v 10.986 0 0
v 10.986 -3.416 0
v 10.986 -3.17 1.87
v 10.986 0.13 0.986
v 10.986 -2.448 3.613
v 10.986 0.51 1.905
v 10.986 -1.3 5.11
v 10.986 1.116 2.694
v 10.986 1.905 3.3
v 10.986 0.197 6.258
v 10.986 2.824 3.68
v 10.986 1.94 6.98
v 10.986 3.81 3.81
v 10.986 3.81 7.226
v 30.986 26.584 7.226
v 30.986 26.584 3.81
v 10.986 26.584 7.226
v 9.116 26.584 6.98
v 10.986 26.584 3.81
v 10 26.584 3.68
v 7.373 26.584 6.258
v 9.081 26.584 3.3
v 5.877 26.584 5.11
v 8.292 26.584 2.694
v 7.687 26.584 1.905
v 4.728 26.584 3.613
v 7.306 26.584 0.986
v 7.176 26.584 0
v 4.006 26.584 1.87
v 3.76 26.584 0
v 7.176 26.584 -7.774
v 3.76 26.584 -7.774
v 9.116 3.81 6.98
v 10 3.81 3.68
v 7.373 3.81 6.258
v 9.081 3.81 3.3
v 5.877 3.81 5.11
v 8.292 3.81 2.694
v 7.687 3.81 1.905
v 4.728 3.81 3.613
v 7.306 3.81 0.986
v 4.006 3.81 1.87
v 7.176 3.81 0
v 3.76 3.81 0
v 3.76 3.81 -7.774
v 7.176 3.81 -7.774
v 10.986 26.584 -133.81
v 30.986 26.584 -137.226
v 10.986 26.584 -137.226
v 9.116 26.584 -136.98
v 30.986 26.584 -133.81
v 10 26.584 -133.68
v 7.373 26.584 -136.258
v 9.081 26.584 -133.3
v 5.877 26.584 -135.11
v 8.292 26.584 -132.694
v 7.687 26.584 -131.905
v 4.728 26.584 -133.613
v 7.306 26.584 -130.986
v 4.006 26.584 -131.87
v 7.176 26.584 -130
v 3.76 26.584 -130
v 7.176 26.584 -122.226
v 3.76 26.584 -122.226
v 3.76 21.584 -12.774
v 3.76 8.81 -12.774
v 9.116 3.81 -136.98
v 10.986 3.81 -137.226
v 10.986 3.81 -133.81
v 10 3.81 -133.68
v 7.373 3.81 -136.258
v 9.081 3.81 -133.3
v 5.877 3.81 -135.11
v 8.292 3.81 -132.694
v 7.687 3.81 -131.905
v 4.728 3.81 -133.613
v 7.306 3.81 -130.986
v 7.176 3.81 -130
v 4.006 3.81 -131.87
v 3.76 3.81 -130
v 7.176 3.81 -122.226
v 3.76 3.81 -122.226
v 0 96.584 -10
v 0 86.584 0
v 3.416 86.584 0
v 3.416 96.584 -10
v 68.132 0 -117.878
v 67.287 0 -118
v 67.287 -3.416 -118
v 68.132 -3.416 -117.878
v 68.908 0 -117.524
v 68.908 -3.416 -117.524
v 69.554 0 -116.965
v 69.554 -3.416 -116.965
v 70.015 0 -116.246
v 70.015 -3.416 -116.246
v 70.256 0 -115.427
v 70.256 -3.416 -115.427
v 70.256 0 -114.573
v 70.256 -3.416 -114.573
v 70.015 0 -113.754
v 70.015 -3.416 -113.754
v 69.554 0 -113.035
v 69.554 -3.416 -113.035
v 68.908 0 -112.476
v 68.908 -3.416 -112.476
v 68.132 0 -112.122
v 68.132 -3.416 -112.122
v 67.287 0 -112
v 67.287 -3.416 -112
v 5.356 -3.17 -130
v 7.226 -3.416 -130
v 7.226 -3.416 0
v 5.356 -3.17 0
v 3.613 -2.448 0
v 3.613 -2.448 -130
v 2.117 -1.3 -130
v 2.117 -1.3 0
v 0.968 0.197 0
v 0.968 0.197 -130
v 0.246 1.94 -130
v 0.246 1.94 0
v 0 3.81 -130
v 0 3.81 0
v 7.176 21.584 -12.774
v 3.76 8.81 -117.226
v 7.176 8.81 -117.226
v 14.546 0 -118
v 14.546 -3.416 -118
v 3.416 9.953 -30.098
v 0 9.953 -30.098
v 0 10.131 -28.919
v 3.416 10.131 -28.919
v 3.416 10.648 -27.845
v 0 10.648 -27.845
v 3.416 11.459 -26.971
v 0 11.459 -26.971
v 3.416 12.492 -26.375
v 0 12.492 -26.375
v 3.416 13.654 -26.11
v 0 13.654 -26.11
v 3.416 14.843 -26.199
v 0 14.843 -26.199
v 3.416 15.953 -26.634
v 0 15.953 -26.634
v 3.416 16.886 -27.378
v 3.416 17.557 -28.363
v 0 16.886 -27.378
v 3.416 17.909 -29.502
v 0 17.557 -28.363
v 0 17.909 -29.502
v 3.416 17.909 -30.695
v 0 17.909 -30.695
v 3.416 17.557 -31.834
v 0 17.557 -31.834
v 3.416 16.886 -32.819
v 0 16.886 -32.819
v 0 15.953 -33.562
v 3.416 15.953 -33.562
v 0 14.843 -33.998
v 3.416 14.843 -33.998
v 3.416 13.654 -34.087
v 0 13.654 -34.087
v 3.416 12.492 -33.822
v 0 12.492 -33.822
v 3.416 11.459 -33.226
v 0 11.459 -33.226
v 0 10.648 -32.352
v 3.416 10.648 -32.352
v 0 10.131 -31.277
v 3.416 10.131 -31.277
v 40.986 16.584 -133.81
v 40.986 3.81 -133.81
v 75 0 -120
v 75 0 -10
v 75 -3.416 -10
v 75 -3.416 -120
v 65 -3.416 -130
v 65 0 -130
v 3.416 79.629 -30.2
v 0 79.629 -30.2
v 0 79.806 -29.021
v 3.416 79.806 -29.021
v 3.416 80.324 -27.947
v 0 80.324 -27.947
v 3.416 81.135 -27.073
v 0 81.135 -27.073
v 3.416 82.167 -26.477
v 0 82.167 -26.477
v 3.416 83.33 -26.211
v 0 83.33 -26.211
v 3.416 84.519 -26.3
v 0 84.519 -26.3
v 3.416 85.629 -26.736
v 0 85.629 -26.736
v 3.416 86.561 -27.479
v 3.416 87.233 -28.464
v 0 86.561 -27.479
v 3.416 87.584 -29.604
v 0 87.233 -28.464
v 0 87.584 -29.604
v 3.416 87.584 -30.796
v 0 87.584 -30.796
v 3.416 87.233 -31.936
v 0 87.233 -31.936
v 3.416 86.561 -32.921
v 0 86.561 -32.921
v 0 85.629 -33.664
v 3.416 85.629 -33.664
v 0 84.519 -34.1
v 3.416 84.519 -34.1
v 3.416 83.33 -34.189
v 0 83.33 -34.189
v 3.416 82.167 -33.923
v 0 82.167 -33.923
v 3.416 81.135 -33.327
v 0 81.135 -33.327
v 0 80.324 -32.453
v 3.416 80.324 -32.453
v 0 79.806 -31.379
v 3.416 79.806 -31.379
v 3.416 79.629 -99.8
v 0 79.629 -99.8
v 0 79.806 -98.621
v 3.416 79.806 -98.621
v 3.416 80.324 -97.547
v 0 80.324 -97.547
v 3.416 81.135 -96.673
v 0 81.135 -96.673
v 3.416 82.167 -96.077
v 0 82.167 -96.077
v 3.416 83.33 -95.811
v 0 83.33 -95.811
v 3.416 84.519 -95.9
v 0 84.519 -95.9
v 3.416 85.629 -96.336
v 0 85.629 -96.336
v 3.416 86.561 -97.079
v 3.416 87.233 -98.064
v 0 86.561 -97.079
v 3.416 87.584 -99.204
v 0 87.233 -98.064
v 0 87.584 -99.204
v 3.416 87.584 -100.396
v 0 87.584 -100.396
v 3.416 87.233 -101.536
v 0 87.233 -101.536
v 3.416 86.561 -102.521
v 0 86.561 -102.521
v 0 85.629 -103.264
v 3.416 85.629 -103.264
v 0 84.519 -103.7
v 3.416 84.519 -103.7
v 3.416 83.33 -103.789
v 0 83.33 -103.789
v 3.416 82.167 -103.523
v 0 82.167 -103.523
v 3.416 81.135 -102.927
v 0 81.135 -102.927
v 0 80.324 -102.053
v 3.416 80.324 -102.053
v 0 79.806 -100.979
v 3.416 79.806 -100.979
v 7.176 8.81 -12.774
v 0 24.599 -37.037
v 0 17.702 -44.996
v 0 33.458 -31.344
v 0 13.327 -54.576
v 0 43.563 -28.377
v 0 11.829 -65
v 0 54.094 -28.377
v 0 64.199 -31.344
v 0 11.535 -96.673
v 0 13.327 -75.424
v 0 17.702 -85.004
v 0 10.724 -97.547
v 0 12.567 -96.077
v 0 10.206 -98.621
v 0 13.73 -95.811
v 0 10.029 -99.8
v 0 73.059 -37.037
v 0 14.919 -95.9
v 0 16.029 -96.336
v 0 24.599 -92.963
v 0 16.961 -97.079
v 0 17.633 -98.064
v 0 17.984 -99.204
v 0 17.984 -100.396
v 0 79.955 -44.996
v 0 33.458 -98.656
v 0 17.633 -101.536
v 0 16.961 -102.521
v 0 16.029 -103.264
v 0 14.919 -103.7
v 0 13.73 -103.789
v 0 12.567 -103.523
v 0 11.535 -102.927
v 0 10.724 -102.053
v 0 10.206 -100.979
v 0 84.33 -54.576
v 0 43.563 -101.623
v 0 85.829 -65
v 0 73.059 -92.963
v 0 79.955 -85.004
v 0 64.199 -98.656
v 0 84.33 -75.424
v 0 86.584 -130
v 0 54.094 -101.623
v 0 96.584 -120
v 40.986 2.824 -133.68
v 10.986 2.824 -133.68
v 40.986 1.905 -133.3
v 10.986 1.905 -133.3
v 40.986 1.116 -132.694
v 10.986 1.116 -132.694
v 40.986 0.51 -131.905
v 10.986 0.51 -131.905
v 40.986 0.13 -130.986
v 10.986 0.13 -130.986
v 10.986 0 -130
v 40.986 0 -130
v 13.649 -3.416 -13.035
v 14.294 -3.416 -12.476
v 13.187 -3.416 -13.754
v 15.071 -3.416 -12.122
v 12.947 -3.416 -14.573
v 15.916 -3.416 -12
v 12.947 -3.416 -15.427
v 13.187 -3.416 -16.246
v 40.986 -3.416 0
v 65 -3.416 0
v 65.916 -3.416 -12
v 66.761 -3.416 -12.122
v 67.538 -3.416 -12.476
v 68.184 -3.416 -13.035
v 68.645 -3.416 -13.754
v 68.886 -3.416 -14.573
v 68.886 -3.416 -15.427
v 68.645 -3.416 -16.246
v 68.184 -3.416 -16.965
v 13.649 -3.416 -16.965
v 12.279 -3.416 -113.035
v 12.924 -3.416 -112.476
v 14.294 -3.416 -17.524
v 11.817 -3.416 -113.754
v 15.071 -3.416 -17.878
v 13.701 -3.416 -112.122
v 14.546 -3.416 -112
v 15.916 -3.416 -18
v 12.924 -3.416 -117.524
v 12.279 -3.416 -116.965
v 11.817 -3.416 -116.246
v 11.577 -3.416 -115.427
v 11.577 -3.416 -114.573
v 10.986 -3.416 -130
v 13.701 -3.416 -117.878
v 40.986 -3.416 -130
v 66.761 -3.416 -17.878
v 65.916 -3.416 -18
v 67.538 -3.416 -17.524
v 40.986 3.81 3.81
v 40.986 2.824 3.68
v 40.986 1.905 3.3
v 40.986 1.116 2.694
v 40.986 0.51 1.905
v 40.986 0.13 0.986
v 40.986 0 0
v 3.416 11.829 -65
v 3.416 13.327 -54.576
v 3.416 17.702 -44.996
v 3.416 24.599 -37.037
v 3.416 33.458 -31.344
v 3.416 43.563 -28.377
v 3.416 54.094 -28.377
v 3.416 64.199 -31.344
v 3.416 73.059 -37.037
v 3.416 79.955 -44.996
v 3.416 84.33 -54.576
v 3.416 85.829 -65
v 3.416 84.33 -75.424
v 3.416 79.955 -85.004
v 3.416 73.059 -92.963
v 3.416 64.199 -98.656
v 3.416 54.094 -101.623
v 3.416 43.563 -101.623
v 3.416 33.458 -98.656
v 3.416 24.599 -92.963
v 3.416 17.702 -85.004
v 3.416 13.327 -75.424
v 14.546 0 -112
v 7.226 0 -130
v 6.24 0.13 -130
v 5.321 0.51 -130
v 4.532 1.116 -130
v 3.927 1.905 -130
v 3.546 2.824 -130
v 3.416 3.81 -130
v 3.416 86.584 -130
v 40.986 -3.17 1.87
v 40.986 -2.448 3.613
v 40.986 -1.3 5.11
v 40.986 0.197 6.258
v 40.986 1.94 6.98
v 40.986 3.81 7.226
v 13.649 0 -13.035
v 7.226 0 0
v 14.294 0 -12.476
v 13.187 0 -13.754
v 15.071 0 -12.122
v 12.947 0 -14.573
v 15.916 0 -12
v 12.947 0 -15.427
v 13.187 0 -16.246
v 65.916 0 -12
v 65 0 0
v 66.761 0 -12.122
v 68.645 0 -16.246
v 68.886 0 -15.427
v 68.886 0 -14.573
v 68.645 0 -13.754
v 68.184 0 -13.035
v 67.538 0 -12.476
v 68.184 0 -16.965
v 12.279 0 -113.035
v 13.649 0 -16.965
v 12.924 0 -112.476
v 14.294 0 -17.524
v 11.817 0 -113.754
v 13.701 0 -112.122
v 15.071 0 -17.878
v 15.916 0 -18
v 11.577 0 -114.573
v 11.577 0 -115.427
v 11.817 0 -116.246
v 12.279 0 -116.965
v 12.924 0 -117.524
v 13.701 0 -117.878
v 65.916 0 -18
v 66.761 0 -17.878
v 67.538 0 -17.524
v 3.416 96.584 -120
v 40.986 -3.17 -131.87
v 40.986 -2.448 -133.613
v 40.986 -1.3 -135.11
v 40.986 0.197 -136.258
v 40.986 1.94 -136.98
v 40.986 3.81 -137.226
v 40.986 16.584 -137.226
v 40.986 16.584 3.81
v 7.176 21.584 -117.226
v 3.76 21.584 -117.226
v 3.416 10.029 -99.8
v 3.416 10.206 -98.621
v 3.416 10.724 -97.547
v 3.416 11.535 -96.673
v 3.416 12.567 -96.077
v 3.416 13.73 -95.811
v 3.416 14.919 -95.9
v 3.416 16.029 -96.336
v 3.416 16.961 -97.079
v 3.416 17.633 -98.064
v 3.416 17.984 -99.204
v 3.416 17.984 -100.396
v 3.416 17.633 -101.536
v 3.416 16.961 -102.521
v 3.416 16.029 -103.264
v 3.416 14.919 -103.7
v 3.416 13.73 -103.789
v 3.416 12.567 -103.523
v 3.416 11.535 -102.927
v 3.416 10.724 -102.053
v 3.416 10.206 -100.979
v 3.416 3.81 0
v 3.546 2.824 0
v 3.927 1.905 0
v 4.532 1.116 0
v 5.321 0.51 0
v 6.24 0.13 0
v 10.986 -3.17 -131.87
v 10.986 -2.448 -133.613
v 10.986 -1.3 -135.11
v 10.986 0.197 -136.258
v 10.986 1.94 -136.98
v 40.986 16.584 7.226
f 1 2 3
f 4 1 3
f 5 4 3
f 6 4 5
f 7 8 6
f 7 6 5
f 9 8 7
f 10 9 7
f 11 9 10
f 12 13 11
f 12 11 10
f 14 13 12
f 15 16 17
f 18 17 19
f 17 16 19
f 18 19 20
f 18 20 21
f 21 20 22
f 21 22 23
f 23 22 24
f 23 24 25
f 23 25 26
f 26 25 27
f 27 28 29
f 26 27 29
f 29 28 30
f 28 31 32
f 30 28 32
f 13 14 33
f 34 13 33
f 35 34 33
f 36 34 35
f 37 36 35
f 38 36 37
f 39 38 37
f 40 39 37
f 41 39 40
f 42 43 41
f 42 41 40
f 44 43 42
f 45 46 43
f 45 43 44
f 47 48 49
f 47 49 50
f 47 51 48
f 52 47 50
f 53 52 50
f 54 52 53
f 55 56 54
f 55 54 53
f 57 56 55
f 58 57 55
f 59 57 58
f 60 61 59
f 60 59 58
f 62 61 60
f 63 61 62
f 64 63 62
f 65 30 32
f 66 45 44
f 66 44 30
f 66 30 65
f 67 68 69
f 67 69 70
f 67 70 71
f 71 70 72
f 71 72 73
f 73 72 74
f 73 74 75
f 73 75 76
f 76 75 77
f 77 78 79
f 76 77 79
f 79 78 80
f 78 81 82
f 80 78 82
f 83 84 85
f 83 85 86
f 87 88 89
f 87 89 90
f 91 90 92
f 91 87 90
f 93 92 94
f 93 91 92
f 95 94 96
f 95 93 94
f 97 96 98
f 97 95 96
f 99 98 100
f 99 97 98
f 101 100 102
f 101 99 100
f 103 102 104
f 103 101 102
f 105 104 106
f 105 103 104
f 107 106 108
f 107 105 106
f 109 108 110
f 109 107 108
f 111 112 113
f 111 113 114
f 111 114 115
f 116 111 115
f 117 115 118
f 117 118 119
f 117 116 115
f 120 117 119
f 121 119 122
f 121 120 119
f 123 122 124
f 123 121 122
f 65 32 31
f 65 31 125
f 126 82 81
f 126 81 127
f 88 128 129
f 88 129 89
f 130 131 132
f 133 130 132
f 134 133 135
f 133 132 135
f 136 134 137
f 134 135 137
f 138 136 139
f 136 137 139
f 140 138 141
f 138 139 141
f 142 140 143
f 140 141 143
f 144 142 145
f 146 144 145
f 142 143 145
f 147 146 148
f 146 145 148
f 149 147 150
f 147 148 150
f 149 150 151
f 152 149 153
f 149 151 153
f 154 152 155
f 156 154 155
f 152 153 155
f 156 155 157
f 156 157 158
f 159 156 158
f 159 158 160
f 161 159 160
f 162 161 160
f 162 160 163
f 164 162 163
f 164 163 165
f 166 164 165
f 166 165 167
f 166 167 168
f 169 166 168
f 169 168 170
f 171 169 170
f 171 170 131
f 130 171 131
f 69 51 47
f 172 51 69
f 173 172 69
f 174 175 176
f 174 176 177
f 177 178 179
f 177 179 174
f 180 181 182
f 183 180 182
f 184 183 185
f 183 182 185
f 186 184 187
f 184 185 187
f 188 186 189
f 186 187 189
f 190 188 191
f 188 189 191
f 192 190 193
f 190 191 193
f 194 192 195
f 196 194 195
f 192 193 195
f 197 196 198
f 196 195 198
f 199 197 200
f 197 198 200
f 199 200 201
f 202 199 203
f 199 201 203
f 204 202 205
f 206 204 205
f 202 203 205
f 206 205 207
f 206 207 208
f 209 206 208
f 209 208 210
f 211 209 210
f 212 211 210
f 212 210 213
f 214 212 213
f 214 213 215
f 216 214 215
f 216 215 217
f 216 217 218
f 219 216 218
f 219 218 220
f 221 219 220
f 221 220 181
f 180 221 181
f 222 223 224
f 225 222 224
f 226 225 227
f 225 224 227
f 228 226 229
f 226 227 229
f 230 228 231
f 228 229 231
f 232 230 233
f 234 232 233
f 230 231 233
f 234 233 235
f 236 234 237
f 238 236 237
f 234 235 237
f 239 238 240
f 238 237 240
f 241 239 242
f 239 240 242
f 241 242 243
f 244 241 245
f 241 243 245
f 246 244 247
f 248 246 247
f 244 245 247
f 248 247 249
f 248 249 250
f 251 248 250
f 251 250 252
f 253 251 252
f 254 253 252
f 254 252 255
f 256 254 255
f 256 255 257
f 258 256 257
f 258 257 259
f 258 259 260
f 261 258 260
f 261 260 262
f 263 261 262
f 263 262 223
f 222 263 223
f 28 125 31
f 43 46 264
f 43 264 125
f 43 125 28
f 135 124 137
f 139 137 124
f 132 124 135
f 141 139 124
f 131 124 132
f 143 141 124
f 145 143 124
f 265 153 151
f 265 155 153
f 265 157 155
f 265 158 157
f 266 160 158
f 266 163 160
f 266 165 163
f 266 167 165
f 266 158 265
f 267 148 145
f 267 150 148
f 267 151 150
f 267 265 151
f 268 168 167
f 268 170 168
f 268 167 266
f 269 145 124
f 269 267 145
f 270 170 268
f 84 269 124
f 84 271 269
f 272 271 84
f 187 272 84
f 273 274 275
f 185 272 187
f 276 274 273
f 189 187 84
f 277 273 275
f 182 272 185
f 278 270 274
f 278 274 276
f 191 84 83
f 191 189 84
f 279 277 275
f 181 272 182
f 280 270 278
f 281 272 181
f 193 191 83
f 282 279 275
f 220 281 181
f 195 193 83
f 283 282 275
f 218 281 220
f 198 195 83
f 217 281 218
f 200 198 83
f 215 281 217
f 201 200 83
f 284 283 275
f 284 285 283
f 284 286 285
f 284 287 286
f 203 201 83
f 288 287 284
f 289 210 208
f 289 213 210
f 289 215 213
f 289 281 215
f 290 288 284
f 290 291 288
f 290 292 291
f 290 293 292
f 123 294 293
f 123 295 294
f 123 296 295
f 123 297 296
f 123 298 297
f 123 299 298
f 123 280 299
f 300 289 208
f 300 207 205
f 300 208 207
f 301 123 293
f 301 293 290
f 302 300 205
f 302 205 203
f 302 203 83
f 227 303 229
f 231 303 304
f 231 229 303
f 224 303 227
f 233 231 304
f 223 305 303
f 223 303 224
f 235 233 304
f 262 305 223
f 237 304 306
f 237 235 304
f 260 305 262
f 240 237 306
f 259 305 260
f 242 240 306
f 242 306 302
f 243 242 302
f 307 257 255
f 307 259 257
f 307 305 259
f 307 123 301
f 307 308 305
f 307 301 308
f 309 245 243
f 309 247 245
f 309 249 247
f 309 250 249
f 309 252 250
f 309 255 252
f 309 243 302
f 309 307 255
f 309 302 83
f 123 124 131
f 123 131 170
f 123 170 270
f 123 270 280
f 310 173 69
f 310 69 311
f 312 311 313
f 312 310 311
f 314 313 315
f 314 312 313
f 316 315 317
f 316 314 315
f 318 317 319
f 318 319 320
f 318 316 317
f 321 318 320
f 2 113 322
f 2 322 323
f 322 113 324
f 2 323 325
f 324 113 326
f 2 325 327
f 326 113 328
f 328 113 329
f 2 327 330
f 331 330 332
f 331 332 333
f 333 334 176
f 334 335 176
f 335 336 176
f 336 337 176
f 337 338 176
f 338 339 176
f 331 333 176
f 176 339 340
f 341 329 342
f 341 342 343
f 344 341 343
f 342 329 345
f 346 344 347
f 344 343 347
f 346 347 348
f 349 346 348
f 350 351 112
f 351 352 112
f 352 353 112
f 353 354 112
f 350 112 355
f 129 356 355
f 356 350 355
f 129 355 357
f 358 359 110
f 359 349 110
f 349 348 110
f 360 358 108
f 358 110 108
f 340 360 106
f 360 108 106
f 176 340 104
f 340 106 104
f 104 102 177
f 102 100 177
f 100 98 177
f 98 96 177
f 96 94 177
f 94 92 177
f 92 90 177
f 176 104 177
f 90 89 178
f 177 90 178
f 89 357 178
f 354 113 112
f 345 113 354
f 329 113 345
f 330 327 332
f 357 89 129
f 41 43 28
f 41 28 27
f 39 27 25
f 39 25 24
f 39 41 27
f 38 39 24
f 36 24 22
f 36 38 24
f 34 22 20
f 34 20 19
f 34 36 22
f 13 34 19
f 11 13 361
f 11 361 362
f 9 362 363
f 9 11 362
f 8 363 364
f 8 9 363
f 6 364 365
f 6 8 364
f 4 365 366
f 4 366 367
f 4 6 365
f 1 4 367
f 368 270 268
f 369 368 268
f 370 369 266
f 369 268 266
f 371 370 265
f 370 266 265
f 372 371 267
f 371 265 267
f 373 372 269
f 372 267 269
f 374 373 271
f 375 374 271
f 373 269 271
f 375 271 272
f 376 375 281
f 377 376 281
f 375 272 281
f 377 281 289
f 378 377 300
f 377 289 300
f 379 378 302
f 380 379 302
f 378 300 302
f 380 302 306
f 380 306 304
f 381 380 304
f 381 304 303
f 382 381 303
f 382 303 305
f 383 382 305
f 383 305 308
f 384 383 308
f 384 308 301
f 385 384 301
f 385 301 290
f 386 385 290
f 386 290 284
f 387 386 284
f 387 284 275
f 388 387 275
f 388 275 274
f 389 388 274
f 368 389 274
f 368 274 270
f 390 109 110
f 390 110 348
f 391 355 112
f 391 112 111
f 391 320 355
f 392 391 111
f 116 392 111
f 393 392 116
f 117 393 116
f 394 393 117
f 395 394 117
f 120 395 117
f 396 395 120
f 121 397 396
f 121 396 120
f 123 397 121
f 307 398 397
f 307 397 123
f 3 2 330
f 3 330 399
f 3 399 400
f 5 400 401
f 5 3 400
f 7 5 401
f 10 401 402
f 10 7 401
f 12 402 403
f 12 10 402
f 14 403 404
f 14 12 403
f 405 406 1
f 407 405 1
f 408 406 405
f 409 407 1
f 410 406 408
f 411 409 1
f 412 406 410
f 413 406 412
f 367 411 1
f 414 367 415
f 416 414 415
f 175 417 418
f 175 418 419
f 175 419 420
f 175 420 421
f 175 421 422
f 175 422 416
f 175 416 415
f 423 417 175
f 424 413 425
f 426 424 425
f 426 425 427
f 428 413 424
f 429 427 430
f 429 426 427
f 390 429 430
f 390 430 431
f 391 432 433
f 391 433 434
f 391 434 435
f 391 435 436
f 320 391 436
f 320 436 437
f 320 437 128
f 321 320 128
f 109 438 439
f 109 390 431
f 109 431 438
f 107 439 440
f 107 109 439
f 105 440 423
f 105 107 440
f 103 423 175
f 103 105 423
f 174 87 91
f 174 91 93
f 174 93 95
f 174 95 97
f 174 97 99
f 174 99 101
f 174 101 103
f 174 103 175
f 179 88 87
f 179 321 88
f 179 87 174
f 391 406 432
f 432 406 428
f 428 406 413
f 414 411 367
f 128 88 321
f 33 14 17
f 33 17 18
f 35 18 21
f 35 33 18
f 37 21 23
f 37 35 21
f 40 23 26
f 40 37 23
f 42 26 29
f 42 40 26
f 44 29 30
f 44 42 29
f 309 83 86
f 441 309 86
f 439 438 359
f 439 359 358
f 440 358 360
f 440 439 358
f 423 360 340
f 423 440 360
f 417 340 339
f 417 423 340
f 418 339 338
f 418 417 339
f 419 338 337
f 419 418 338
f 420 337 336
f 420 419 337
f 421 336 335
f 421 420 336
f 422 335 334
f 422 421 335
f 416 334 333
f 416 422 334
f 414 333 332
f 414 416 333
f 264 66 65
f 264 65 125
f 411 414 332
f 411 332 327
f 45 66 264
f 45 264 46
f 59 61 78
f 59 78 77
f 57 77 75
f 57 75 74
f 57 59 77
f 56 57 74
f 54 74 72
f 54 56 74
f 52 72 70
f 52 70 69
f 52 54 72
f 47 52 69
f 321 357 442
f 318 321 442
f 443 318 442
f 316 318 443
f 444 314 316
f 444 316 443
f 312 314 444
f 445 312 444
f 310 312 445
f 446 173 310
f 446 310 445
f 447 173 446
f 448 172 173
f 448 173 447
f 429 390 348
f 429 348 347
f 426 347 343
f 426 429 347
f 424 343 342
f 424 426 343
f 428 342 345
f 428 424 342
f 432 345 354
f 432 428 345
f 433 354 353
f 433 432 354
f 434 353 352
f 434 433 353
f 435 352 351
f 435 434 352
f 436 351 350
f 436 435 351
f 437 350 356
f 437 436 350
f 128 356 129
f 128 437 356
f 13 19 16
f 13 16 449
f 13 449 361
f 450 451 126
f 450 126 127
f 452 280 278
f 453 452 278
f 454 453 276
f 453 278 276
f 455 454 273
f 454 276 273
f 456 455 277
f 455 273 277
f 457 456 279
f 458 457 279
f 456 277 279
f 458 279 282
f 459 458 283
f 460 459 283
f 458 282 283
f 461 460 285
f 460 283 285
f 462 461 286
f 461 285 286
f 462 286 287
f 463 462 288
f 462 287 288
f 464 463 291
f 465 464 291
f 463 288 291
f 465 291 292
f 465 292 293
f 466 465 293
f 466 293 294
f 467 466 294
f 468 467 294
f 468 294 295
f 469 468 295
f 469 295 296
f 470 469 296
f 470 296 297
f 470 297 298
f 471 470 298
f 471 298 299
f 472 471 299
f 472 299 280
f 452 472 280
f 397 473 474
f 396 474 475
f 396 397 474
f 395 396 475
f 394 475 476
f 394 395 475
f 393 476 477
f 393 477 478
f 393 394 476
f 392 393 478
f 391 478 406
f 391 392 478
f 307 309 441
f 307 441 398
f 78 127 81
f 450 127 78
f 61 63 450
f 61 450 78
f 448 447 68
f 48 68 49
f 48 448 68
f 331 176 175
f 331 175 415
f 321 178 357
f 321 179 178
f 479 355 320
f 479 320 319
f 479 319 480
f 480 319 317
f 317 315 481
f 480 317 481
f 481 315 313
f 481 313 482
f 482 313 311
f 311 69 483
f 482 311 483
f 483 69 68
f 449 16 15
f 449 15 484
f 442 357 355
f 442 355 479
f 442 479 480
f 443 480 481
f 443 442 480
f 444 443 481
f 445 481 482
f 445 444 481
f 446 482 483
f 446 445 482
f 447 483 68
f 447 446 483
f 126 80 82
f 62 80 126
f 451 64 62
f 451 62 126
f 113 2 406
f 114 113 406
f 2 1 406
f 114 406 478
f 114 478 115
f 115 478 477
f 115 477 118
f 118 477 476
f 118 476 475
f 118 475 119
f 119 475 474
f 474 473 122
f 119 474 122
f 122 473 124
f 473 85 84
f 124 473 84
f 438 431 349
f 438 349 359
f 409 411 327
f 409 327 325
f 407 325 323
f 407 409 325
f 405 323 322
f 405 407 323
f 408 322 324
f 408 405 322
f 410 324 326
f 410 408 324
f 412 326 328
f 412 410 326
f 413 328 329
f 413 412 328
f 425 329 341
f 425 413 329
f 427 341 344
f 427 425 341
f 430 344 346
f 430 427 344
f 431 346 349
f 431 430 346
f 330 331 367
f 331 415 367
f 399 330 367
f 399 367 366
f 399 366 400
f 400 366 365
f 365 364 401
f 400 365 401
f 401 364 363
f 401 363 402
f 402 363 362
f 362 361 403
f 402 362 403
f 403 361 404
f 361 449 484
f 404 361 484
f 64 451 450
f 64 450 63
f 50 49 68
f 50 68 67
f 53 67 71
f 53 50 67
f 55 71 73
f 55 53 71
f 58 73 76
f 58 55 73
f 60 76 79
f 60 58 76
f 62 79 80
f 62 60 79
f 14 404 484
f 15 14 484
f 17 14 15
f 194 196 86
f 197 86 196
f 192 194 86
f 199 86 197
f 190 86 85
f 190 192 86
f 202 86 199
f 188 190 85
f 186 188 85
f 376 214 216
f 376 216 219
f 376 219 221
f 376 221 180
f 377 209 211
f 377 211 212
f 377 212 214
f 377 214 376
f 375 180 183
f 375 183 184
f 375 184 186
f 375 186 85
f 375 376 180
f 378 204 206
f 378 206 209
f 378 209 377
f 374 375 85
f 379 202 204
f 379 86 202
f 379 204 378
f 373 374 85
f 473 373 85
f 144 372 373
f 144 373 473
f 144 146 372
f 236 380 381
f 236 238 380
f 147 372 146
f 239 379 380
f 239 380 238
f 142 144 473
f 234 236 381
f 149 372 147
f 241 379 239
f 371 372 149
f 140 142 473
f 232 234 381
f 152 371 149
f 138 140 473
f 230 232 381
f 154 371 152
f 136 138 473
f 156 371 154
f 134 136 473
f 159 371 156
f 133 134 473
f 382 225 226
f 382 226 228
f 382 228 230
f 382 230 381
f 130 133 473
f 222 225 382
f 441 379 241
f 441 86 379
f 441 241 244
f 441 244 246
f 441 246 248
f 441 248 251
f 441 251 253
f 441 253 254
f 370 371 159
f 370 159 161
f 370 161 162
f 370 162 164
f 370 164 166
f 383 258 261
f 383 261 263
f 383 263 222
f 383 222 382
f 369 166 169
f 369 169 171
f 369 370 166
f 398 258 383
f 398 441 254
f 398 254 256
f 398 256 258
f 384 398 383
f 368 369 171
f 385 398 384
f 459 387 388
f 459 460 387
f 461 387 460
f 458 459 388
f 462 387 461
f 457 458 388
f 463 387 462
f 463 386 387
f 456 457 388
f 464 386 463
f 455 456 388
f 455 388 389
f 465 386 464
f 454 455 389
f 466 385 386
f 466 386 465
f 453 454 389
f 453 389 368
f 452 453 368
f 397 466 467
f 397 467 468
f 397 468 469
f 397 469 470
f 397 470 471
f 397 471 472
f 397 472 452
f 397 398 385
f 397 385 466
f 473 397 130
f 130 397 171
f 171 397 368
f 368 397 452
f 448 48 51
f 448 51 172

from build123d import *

# Parameters (mm, degrees)
SKETCH1_W                    = 75
SKETCH1_H                    = 130
BASE_FLANGE1_DEPTH           = 3.4163
EDGE_FLANGE1_STRIP_W         = 21.2852
EDGE_FLANGE1_STRIP_H         = 3.4163
EDGE_FLANGE1_STRIP_CUT_DEPTH = 130
EDGE_FLANGE1_DEPTH           = 130
SKETCH18_R                   = 37
SKETCH18_R_2                 = 4
CUT_EXTRUDE1_DEPTH           = 10
BREAK_CORNER1_DEPTH          = 3.4163
BREAK_CORNER2_START          = -3.4163
BREAK_CORNER2_DEPTH          = 3.4163
CUT_EXTRUDE2_DEPTH           = 10
EDGE_FLANGE2_DEPTH           = 30
EDGE_FLANGE3_DEPTH           = 22.7737
EDGE_FLANGE4_DEPTH           = 30
EDGE_FLANGE5_DEPTH           = 22.7737
BREAK_CORNER3_START          = 40.708137393
BREAK_CORNER3_OUTLINE_W      = 17
BREAK_CORNER3_OUTLINE_H      = 3.4163
BREAK_CORNER3_DEPTH          = 7.071067812
BREAK_CORNER4_START          = 3.76
BREAK_CORNER4_DEPTH          = 3.4163


# Read off the part's stored shape, not the designer's step: Break-Corner1, Break-Corner2, Break-Corner3, Break-Corner4
# Sheet-metal steps are written as plain solids
with BuildPart() as part:
    # Sketch1 → Base-Flange1 (new body)
    with BuildSketch(Plane(origin=(0, 0, 0), x_dir=(1, 0, 0), z_dir=(0, 1, 0))):
        with Locations((37.5, 65)):
            Rectangle(SKETCH1_W, SKETCH1_H)
    extrude(amount=-BASE_FLANGE1_DEPTH)

    # Edge-Flange1 strip (across the edge) → Edge-Flange1 strip cut (cut)
    with BuildSketch(Plane.XY.offset(-130)):
        with Locations((-3.4163, -1.70815)):
            Rectangle(EDGE_FLANGE1_STRIP_W, EDGE_FLANGE1_STRIP_H)
    extrude(amount=EDGE_FLANGE1_STRIP_CUT_DEPTH, mode=Mode.SUBTRACT)

    # Edge-Flange1 section (across the edge) → Edge-Flange1 (add)
    with BuildSketch(Plane.XY.offset(-130)):
        with BuildLine():
            Line((0, 3.81), (0, 96.5837))
            Line((0, 96.5837), (3.4163, 96.5837))
            Line((3.4163, 96.5837), (3.4163, 3.81))
            ThreePointArc((3.4163, 3.81), (4.532223164, 1.115923164), (7.2263, 0))
            Line((7.2263, 0), (7.2263, -3.4163))
            ThreePointArc((7.2263, -3.4163), (2.116534267, -1.299765733), (0, 3.81))
        make_face()
    extrude(amount=EDGE_FLANGE1_DEPTH)

    # Sketch18 → Cut-Extrude1 (cut)
    with BuildSketch(Plane.ZY):
        with Locations(Location((-65, 48.8287, 0), (0, 0, 270))):
            Circle(SKETCH18_R)
        with Locations(Location((-99.8, 83.6287, 0), (0, 0, 270))):
            Circle(SKETCH18_R_2)
        with Locations(Location((-30.2, 83.6287, 0), (0, 0, 270))):
            Circle(SKETCH18_R_2)
        with Locations(Location((-30.098341997, 13.953302375, 0), (0, 0, 270))):
            Circle(SKETCH18_R_2)
        with Locations(Location((-99.8, 14.0287, 0), (0, 0, 270))):
            Circle(SKETCH18_R_2)
    extrude(amount=-CUT_EXTRUDE1_DEPTH, mode=Mode.SUBTRACT)

    # Break-Corner1 outline → Break-Corner1 (cut)
    with BuildSketch(Plane.YZ):
        Polygon((96.5837, 0), (86.5837, 0), (96.5837, -10), align=None)
        Polygon((96.5837, -130), (96.5837, -120), (86.5837, -130), align=None)
    extrude(amount=BREAK_CORNER1_DEPTH, mode=Mode.SUBTRACT)

    # Break-Corner2 outline → Break-Corner2 (cut)
    with BuildSketch(Plane(origin=(0, 0, 0), x_dir=(1, 0, 0), z_dir=(0, 1, 0)).offset(BREAK_CORNER2_START)):
        Polygon((75, 0), (75, 10), (65, 0), align=None)
        Polygon((65, 130), (75, 120), (75, 130), align=None)
    extrude(amount=BREAK_CORNER2_DEPTH, mode=Mode.SUBTRACT)

    # Sketch19 → Cut-Extrude2 (cut)
    with BuildSketch(Plane(origin=(0, 0, 0), x_dir=(1, 0, 0), z_dir=(0, 1, 0))):
        with BuildLine():
            Line((67.28653865, 112), (14.54606135, 112))
            ThreePointArc((14.54606135, 112), (11.54606135, 115), (14.54606135, 118))
            Line((14.54606135, 118), (67.28653865, 118))
            ThreePointArc((67.28653865, 118), (70.28653865, 115), (67.28653865, 112))
        make_face()
        with BuildLine():
            Line((65.9163, 12), (15.9163, 12))
            ThreePointArc((15.9163, 12), (12.9163, 15), (15.9163, 18))
            Line((15.9163, 18), (65.9163, 18))
            ThreePointArc((65.9163, 18), (68.9163, 15), (65.9163, 12))
        make_face()
    extrude(amount=-CUT_EXTRUDE2_DEPTH, mode=Mode.SUBTRACT)

    # Edge-Flange2 section (across the edge) → Edge-Flange2 (add)
    with BuildSketch(Plane(origin=(10.9863, 0, 3.81), x_dir=(0, 0, -1), z_dir=(1, 0, 0))):
        with BuildLine():
            Line((-3.4163, 3.81), (-3.4163, 26.5837))
            Line((-3.4163, 26.5837), (0, 26.5837))
            Line((0, 26.5837), (0, 3.81))
            ThreePointArc((0, 3.81), (1.115923164, 1.115923164), (3.81, 0))
            Line((3.81, 0), (3.81, -3.4163))
            ThreePointArc((3.81, -3.4163), (-1.299765733, -1.299765733), (-3.4163, 3.81))
        make_face()
    extrude(amount=EDGE_FLANGE2_DEPTH)

    # Edge-Flange3 section (across the edge) → Edge-Flange3 (add)
    with BuildSketch(Plane(origin=(7.1763, 3.81, 3.81), x_dir=(1, 0, 0), z_dir=(0, 1, 0))):
        with BuildLine():
            Line((-3.4163, 3.81), (-3.4163, 16.5837))
            Line((-3.4163, 16.5837), (0, 16.5837))
            Line((0, 16.5837), (0, 3.81))
            ThreePointArc((0, 3.81), (1.115923164, 1.115923164), (3.81, 0))
            Line((3.81, 0), (3.81, -3.4163))
            ThreePointArc((3.81, -3.4163), (-1.299765733, -1.299765733), (-3.4163, 3.81))
        make_face()
    extrude(amount=EDGE_FLANGE3_DEPTH)

    # Edge-Flange4 section (across the edge) → Edge-Flange4 (add)
    with BuildSketch(Plane(origin=(40.9863, 0, -133.81), x_dir=(0, 0, 1), z_dir=(-1, 0, 0))):
        with BuildLine():
            Line((-3.4163, 3.81), (-3.4163, 26.5837))
            Line((-3.4163, 26.5837), (0, 26.5837))
            Line((0, 26.5837), (0, 3.81))
            ThreePointArc((0, 3.81), (1.115923164, 1.115923164), (3.81, 0))
            Line((3.81, 0), (3.81, -3.4163))
            ThreePointArc((3.81, -3.4163), (-1.299765733, -1.299765733), (-3.4163, 3.81))
        make_face()
    extrude(amount=EDGE_FLANGE4_DEPTH)

    # Edge-Flange5 section (across the edge) → Edge-Flange5 (add)
    with BuildSketch(Plane(origin=(7.1763, 26.5837, -133.81), x_dir=(1, 0, 0), z_dir=(0, -1, 0))):
        with BuildLine():
            Line((-3.4163, 3.81), (-3.4163, 16.5837))
            Line((-3.4163, 16.5837), (0, 16.5837))
            Line((0, 16.5837), (0, 3.81))
            ThreePointArc((0, 3.81), (1.115923164, 1.115923164), (3.81, 0))
            Line((3.81, 0), (3.81, -3.4163))
            ThreePointArc((3.81, -3.4163), (-1.299765733, -1.299765733), (-3.4163, 3.81))
        make_face()
    extrude(amount=EDGE_FLANGE5_DEPTH)

    # Break-Corner3 outline → Break-Corner3 (cut)
    with BuildSketch(Plane(origin=(0, 0, 0), x_dir=(0.7071067811865471, -0.707106781186548, 0), z_dir=(0.707106781186548, 0.707106781186547, 0)).offset(BREAK_CORNER3_START)):
        with Locations((10.5, -5.51815)):
            Rectangle(BREAK_CORNER3_OUTLINE_W, BREAK_CORNER3_OUTLINE_H)
        with Locations((10.5, 135.51815)):
            Rectangle(BREAK_CORNER3_OUTLINE_W, BREAK_CORNER3_OUTLINE_H)
    extrude(amount=BREAK_CORNER3_DEPTH, mode=Mode.SUBTRACT)

    # Break-Corner4 outline → Break-Corner4 (cut)
    with BuildSketch(Plane.YZ.offset(BREAK_CORNER4_START)):
        Polygon((3.81, -12.7737), (8.81, -12.7737), (3.81, -7.7737), align=None)
        Polygon((26.5837, -7.7737), (21.5837, -12.7737), (26.5837, -12.7737), align=None)
        Polygon((26.5837, -117.2263), (21.5837, -117.2263), (26.5837, -122.2263), align=None)
        Polygon((3.81, -122.2263), (8.81, -117.2263), (3.81, -117.2263), align=None)
    extrude(amount=BREAK_CORNER4_DEPTH, mode=Mode.SUBTRACT)


solid = part.part
